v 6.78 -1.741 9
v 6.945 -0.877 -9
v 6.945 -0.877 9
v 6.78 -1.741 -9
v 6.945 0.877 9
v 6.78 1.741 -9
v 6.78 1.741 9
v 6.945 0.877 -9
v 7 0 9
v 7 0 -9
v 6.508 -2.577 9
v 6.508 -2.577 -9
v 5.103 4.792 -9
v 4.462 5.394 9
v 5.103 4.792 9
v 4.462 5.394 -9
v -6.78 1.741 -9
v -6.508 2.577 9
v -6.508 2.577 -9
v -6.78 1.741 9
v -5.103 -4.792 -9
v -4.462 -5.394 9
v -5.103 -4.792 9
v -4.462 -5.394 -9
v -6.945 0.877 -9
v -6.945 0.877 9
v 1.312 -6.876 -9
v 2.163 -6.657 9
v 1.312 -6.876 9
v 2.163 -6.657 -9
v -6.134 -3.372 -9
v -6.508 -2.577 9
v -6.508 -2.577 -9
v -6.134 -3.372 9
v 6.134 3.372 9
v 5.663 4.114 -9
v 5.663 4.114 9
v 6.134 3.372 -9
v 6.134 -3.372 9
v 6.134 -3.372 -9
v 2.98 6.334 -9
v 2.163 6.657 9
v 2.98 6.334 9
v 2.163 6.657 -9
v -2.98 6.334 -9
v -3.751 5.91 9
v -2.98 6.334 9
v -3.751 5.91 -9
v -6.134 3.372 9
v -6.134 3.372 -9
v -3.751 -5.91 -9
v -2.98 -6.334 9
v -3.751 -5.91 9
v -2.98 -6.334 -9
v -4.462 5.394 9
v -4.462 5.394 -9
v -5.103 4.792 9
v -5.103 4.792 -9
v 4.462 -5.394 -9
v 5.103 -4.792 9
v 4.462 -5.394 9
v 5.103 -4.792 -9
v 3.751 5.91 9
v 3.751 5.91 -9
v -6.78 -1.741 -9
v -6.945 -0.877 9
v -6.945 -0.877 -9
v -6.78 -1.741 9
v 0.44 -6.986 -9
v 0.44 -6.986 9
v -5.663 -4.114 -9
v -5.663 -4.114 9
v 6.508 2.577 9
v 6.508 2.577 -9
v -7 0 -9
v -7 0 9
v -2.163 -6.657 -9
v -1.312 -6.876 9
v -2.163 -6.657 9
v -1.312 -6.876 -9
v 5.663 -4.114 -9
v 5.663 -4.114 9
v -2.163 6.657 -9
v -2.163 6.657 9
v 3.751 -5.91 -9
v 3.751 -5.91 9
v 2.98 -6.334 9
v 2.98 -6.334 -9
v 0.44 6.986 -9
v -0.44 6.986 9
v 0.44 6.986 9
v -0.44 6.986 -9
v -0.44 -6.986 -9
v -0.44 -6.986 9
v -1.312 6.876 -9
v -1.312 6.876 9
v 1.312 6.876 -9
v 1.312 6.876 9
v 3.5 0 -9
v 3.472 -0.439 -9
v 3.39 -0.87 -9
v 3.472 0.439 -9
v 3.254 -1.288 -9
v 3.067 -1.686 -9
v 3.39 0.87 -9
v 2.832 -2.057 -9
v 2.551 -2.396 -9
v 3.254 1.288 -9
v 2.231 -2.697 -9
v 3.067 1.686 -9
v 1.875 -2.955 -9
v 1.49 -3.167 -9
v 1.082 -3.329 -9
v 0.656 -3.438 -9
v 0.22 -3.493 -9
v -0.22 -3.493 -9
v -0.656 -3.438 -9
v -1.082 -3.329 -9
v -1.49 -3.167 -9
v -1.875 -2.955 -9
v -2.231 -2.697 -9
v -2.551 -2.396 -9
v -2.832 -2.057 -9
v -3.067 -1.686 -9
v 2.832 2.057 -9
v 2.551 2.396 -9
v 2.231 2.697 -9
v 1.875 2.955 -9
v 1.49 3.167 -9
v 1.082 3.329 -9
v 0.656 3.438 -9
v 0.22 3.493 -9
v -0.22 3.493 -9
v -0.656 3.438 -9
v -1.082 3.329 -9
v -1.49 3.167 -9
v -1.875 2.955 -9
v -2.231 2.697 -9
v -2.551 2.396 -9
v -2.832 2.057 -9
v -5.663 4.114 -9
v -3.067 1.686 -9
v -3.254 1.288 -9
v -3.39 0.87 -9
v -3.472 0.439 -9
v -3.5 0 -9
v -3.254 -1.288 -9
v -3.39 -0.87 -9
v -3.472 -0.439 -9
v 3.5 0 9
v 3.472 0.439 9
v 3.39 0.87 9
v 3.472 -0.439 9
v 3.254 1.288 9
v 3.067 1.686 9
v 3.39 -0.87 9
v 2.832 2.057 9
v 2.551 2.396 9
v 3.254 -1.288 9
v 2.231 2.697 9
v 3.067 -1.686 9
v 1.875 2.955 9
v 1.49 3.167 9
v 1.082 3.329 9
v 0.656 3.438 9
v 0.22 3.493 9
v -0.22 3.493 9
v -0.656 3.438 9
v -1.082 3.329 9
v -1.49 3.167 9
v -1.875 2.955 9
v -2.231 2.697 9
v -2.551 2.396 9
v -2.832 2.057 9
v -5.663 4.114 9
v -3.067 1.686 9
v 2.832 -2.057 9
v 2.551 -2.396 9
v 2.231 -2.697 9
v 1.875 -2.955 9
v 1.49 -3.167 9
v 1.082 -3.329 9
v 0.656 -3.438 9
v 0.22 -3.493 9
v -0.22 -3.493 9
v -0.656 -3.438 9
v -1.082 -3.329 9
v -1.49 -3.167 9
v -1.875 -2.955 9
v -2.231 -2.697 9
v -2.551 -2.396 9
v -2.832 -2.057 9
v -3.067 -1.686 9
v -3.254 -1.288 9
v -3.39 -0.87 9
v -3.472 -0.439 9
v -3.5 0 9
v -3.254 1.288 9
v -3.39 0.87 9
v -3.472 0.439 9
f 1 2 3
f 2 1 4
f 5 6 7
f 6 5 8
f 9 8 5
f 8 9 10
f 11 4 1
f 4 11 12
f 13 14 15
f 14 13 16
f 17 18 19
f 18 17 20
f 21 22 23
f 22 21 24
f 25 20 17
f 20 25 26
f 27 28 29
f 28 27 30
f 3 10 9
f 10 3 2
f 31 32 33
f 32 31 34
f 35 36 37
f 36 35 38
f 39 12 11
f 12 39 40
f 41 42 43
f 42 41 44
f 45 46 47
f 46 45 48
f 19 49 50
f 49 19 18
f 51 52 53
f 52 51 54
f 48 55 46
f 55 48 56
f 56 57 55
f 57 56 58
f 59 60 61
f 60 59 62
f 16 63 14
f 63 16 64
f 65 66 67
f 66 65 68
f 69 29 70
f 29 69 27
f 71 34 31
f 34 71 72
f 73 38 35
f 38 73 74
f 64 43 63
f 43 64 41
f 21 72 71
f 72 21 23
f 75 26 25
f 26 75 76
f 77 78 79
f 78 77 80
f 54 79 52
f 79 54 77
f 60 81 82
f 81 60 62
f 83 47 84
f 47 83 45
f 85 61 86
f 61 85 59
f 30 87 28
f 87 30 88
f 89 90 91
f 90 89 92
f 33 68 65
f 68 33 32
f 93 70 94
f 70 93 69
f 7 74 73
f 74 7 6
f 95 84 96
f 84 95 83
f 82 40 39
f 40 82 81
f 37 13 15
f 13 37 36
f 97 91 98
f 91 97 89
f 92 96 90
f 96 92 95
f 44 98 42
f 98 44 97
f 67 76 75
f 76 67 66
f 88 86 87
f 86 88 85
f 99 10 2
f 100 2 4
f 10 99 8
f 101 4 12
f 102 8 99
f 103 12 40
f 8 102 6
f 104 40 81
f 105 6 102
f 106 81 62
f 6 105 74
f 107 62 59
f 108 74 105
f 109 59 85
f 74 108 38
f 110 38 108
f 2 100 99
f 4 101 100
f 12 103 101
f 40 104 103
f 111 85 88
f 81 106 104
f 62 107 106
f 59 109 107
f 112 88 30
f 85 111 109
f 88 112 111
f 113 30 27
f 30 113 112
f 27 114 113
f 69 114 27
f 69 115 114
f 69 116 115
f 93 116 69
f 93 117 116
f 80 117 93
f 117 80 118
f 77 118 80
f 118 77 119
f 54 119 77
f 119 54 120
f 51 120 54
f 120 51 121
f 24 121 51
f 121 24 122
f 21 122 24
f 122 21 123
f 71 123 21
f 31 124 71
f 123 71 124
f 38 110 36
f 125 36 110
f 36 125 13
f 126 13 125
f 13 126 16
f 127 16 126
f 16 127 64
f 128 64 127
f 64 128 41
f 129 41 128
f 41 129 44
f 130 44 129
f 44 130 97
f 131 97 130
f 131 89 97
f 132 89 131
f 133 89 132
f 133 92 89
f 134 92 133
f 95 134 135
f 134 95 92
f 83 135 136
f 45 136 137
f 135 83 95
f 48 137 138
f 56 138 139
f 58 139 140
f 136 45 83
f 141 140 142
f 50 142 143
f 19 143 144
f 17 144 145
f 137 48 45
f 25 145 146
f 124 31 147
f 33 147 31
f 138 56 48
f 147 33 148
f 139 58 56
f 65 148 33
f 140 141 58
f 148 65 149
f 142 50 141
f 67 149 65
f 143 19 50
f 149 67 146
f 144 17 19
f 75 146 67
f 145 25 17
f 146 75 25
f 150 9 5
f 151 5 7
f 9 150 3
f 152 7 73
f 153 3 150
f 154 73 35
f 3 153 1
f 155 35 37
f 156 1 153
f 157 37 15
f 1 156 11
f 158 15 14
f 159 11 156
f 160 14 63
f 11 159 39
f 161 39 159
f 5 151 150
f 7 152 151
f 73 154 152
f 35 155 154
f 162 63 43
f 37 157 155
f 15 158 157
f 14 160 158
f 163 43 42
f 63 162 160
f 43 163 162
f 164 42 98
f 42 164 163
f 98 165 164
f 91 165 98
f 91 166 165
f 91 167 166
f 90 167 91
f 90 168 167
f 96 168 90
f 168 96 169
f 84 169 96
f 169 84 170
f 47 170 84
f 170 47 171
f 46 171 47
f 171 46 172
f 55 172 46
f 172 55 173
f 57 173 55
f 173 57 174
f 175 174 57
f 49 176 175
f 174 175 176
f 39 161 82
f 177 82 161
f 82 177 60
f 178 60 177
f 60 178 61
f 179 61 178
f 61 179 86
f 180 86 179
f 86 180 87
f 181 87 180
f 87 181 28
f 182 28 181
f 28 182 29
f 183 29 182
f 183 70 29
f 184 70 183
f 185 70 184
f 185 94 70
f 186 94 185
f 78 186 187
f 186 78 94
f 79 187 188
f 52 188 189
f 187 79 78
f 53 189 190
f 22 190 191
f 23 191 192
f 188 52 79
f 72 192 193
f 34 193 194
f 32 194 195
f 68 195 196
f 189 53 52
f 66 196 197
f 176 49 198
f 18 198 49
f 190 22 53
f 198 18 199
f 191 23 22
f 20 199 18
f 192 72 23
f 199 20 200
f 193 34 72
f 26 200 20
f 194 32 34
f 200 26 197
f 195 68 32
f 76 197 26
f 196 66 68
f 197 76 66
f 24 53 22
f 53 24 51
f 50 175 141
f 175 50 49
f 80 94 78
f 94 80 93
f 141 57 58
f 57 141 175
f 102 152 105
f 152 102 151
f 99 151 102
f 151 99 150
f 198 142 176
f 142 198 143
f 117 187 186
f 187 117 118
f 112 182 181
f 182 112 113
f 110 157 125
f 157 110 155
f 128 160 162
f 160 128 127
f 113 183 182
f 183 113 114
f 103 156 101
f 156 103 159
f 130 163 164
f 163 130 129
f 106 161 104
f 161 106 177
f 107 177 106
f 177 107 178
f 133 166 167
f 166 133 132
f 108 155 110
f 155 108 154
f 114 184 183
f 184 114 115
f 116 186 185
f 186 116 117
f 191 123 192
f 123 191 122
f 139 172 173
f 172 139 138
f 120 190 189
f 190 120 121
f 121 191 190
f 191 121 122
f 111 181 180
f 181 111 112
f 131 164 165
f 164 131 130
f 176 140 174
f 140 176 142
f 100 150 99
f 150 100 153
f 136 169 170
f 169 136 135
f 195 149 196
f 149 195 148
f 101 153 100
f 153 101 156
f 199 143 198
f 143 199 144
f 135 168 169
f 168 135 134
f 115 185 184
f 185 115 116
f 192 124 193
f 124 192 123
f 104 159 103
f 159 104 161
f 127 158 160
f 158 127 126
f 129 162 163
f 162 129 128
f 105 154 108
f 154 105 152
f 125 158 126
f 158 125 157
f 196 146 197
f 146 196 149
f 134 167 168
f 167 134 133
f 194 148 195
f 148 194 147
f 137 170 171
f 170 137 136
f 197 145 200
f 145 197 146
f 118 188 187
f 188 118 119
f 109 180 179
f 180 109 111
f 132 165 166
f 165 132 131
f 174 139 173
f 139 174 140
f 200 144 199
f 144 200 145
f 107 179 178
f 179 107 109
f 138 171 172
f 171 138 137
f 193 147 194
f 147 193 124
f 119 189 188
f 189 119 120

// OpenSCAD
$fn = 50;


difference() {
	union() {
		translate(v = [0, 0, -9.0000000000]) {
			cylinder(h = 18, r = 7.0000000000);
		}
	}
	union() {
		translate(v = [0, 0, -100.0000000000]) {
			cylinder(h = 200, r = 3.5000000000);
		}
	}
}
